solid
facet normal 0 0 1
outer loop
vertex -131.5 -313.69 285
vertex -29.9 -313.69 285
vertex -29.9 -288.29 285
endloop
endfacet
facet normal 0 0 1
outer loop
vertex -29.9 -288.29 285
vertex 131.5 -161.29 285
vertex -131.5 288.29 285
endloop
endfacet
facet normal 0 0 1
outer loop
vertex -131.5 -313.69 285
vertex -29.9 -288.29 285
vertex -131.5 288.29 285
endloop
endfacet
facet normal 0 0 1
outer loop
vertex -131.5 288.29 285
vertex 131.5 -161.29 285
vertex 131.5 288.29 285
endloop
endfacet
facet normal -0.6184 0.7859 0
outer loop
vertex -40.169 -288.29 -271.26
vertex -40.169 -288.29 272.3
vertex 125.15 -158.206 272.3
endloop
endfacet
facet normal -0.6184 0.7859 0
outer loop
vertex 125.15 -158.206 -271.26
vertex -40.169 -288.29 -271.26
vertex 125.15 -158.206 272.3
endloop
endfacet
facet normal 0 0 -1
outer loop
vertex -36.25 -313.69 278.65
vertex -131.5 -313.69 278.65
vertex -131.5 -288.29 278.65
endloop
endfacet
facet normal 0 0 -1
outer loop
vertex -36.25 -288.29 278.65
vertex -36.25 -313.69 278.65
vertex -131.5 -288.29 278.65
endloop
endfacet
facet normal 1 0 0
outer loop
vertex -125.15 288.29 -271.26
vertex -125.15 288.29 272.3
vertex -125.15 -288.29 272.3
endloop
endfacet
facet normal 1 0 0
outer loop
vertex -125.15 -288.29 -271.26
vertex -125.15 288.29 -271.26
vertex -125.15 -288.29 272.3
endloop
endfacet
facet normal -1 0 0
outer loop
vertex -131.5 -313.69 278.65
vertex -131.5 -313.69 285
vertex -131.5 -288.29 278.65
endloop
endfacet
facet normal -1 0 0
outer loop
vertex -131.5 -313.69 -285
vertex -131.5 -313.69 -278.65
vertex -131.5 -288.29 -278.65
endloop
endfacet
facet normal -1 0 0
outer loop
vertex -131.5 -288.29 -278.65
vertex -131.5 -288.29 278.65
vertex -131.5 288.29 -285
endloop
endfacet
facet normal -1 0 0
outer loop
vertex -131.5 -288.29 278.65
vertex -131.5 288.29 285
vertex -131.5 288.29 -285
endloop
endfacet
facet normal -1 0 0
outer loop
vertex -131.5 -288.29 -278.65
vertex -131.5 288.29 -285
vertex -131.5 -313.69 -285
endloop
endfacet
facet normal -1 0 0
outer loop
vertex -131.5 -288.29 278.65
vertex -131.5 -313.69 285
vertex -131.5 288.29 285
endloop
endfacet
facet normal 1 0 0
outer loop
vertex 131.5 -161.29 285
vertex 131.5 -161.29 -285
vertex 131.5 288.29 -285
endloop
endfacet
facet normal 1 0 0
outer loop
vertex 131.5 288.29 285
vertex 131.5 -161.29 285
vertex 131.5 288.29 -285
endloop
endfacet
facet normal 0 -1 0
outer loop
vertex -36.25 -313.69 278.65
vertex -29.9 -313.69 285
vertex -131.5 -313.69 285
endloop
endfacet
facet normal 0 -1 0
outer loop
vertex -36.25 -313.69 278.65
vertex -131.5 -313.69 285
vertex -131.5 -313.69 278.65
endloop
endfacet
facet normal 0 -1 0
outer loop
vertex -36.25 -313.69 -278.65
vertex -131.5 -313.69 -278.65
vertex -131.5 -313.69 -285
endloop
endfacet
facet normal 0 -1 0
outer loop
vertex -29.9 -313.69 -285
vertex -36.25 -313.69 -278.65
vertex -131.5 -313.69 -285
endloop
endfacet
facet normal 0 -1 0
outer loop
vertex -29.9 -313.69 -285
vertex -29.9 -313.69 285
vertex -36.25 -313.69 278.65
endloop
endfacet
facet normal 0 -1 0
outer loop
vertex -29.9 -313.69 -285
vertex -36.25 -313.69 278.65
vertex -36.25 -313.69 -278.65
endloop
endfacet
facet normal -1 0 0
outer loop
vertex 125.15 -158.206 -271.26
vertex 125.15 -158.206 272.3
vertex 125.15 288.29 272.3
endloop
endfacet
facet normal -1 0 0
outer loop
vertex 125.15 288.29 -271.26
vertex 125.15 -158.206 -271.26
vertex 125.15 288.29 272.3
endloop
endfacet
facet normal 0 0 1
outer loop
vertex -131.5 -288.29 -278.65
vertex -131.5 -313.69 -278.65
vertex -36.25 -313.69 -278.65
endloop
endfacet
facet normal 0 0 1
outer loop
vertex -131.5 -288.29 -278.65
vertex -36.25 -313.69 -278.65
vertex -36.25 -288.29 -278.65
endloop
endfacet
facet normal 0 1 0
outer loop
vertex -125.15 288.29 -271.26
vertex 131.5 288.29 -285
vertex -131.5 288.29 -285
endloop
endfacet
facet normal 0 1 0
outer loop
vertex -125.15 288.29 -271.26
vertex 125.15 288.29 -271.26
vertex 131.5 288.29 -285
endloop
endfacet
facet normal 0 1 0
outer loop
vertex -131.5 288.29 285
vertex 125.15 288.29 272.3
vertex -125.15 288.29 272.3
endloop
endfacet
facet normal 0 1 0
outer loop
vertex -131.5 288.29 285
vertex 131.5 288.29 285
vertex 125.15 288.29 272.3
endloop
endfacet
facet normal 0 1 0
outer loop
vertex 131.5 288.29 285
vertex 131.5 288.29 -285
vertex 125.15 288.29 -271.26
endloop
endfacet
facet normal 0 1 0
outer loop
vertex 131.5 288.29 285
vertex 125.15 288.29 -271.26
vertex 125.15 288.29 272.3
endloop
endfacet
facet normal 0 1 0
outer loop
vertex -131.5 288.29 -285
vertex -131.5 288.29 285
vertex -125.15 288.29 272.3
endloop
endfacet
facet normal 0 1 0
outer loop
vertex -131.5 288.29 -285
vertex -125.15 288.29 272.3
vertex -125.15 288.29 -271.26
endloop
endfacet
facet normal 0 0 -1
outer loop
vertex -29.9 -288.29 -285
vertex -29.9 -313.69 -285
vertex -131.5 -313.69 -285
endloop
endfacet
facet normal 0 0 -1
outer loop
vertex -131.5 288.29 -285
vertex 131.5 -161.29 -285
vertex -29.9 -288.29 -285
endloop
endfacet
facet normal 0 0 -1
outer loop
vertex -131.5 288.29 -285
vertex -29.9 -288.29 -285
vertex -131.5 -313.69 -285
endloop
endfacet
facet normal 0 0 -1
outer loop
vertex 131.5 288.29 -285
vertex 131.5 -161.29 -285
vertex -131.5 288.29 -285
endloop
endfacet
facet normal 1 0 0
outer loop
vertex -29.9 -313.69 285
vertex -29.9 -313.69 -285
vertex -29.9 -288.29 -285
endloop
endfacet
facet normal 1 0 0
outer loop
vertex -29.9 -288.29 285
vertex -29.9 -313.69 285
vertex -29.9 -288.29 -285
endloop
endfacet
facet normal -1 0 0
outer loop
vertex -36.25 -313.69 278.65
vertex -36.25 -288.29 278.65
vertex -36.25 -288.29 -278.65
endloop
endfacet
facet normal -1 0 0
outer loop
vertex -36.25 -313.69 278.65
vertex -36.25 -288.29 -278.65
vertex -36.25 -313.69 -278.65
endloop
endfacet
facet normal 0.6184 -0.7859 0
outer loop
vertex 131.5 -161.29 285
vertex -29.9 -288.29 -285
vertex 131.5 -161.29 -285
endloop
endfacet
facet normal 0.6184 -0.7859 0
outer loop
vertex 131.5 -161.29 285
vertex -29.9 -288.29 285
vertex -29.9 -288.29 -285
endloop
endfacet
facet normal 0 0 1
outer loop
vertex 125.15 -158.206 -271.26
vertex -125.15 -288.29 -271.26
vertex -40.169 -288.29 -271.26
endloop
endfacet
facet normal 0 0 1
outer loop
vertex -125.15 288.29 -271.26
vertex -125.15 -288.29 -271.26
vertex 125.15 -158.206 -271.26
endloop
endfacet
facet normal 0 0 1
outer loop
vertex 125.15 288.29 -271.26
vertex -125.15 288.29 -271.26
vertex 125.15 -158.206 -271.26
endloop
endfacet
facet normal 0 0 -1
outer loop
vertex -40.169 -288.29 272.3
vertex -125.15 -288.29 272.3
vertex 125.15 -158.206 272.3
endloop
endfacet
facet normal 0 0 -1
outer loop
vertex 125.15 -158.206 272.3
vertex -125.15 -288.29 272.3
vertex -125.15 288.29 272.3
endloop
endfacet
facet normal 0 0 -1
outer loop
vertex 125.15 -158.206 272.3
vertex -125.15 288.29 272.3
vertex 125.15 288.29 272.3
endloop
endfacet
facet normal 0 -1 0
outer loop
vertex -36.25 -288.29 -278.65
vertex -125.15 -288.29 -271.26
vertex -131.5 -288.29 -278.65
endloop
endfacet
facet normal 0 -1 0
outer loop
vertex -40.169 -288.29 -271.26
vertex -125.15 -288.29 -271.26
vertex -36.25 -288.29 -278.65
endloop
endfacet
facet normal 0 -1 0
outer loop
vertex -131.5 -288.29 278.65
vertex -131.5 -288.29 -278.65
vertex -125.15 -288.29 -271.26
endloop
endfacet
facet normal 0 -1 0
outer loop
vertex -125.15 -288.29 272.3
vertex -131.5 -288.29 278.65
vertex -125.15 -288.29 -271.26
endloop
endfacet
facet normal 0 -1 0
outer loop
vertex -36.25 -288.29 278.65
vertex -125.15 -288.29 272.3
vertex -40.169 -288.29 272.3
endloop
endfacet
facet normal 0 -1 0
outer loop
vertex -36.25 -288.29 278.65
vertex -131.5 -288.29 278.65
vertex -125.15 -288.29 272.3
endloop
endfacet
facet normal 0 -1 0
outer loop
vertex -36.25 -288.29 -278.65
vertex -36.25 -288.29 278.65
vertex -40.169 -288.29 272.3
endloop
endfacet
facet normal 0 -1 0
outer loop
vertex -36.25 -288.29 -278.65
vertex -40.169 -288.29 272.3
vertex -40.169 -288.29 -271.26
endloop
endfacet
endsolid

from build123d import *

# Parameters (mm, degrees)
BOSS_EXTRU_1_DEPTH      = 285
ENL_V_MAT_EXTRU_1_DEPTH = 543.56
ESQUISSE4_W             = 6.35
ESQUISSE4_H             = 25.4
BOSS_EXTRU_2_DEPTH      = 95.25


with BuildPart() as part:
    # Esquisse1 → Boss.-Extru.1 (new, symmetric)
    with BuildSketch(Plane.XY):
        Polygon((-29.9, -288.29), (131.5, -161.29), (131.5, 288.29), (-131.5, 288.29), (-131.5, -288.29), (-36.25, -288.29), (-36.25, -313.69), (-29.9, -313.69), align=None)
    extrude(amount=BOSS_EXTRU_1_DEPTH, both=True)

    # Esquisse2 → Enlèv. mat.-Extru.1 (cut)
    with BuildSketch(Plane.XY.offset(272.3)):
        Polygon((-125.15, 288.29), (-125.15, -288.29), (-40.168758445, -288.29), (125.15, -158.206466403), (125.15, 288.29), align=None)
    extrude(amount=-ENL_V_MAT_EXTRU_1_DEPTH, mode=Mode.SUBTRACT)

    # Esquisse4 → Boss.-Extru.2 (add)
    with BuildSketch(Plane.ZY.offset(36.25)):
        with Locations((-281.825, -300.99)):
            Rectangle(ESQUISSE4_W, ESQUISSE4_H)
    boss_extru_2 = extrude(amount=BOSS_EXTRU_2_DEPTH)

    # Symétrie1: Boss.-Extru.2 across plane
    add(boss_extru_2.mirror(Plane.XY))


solid = part.part
